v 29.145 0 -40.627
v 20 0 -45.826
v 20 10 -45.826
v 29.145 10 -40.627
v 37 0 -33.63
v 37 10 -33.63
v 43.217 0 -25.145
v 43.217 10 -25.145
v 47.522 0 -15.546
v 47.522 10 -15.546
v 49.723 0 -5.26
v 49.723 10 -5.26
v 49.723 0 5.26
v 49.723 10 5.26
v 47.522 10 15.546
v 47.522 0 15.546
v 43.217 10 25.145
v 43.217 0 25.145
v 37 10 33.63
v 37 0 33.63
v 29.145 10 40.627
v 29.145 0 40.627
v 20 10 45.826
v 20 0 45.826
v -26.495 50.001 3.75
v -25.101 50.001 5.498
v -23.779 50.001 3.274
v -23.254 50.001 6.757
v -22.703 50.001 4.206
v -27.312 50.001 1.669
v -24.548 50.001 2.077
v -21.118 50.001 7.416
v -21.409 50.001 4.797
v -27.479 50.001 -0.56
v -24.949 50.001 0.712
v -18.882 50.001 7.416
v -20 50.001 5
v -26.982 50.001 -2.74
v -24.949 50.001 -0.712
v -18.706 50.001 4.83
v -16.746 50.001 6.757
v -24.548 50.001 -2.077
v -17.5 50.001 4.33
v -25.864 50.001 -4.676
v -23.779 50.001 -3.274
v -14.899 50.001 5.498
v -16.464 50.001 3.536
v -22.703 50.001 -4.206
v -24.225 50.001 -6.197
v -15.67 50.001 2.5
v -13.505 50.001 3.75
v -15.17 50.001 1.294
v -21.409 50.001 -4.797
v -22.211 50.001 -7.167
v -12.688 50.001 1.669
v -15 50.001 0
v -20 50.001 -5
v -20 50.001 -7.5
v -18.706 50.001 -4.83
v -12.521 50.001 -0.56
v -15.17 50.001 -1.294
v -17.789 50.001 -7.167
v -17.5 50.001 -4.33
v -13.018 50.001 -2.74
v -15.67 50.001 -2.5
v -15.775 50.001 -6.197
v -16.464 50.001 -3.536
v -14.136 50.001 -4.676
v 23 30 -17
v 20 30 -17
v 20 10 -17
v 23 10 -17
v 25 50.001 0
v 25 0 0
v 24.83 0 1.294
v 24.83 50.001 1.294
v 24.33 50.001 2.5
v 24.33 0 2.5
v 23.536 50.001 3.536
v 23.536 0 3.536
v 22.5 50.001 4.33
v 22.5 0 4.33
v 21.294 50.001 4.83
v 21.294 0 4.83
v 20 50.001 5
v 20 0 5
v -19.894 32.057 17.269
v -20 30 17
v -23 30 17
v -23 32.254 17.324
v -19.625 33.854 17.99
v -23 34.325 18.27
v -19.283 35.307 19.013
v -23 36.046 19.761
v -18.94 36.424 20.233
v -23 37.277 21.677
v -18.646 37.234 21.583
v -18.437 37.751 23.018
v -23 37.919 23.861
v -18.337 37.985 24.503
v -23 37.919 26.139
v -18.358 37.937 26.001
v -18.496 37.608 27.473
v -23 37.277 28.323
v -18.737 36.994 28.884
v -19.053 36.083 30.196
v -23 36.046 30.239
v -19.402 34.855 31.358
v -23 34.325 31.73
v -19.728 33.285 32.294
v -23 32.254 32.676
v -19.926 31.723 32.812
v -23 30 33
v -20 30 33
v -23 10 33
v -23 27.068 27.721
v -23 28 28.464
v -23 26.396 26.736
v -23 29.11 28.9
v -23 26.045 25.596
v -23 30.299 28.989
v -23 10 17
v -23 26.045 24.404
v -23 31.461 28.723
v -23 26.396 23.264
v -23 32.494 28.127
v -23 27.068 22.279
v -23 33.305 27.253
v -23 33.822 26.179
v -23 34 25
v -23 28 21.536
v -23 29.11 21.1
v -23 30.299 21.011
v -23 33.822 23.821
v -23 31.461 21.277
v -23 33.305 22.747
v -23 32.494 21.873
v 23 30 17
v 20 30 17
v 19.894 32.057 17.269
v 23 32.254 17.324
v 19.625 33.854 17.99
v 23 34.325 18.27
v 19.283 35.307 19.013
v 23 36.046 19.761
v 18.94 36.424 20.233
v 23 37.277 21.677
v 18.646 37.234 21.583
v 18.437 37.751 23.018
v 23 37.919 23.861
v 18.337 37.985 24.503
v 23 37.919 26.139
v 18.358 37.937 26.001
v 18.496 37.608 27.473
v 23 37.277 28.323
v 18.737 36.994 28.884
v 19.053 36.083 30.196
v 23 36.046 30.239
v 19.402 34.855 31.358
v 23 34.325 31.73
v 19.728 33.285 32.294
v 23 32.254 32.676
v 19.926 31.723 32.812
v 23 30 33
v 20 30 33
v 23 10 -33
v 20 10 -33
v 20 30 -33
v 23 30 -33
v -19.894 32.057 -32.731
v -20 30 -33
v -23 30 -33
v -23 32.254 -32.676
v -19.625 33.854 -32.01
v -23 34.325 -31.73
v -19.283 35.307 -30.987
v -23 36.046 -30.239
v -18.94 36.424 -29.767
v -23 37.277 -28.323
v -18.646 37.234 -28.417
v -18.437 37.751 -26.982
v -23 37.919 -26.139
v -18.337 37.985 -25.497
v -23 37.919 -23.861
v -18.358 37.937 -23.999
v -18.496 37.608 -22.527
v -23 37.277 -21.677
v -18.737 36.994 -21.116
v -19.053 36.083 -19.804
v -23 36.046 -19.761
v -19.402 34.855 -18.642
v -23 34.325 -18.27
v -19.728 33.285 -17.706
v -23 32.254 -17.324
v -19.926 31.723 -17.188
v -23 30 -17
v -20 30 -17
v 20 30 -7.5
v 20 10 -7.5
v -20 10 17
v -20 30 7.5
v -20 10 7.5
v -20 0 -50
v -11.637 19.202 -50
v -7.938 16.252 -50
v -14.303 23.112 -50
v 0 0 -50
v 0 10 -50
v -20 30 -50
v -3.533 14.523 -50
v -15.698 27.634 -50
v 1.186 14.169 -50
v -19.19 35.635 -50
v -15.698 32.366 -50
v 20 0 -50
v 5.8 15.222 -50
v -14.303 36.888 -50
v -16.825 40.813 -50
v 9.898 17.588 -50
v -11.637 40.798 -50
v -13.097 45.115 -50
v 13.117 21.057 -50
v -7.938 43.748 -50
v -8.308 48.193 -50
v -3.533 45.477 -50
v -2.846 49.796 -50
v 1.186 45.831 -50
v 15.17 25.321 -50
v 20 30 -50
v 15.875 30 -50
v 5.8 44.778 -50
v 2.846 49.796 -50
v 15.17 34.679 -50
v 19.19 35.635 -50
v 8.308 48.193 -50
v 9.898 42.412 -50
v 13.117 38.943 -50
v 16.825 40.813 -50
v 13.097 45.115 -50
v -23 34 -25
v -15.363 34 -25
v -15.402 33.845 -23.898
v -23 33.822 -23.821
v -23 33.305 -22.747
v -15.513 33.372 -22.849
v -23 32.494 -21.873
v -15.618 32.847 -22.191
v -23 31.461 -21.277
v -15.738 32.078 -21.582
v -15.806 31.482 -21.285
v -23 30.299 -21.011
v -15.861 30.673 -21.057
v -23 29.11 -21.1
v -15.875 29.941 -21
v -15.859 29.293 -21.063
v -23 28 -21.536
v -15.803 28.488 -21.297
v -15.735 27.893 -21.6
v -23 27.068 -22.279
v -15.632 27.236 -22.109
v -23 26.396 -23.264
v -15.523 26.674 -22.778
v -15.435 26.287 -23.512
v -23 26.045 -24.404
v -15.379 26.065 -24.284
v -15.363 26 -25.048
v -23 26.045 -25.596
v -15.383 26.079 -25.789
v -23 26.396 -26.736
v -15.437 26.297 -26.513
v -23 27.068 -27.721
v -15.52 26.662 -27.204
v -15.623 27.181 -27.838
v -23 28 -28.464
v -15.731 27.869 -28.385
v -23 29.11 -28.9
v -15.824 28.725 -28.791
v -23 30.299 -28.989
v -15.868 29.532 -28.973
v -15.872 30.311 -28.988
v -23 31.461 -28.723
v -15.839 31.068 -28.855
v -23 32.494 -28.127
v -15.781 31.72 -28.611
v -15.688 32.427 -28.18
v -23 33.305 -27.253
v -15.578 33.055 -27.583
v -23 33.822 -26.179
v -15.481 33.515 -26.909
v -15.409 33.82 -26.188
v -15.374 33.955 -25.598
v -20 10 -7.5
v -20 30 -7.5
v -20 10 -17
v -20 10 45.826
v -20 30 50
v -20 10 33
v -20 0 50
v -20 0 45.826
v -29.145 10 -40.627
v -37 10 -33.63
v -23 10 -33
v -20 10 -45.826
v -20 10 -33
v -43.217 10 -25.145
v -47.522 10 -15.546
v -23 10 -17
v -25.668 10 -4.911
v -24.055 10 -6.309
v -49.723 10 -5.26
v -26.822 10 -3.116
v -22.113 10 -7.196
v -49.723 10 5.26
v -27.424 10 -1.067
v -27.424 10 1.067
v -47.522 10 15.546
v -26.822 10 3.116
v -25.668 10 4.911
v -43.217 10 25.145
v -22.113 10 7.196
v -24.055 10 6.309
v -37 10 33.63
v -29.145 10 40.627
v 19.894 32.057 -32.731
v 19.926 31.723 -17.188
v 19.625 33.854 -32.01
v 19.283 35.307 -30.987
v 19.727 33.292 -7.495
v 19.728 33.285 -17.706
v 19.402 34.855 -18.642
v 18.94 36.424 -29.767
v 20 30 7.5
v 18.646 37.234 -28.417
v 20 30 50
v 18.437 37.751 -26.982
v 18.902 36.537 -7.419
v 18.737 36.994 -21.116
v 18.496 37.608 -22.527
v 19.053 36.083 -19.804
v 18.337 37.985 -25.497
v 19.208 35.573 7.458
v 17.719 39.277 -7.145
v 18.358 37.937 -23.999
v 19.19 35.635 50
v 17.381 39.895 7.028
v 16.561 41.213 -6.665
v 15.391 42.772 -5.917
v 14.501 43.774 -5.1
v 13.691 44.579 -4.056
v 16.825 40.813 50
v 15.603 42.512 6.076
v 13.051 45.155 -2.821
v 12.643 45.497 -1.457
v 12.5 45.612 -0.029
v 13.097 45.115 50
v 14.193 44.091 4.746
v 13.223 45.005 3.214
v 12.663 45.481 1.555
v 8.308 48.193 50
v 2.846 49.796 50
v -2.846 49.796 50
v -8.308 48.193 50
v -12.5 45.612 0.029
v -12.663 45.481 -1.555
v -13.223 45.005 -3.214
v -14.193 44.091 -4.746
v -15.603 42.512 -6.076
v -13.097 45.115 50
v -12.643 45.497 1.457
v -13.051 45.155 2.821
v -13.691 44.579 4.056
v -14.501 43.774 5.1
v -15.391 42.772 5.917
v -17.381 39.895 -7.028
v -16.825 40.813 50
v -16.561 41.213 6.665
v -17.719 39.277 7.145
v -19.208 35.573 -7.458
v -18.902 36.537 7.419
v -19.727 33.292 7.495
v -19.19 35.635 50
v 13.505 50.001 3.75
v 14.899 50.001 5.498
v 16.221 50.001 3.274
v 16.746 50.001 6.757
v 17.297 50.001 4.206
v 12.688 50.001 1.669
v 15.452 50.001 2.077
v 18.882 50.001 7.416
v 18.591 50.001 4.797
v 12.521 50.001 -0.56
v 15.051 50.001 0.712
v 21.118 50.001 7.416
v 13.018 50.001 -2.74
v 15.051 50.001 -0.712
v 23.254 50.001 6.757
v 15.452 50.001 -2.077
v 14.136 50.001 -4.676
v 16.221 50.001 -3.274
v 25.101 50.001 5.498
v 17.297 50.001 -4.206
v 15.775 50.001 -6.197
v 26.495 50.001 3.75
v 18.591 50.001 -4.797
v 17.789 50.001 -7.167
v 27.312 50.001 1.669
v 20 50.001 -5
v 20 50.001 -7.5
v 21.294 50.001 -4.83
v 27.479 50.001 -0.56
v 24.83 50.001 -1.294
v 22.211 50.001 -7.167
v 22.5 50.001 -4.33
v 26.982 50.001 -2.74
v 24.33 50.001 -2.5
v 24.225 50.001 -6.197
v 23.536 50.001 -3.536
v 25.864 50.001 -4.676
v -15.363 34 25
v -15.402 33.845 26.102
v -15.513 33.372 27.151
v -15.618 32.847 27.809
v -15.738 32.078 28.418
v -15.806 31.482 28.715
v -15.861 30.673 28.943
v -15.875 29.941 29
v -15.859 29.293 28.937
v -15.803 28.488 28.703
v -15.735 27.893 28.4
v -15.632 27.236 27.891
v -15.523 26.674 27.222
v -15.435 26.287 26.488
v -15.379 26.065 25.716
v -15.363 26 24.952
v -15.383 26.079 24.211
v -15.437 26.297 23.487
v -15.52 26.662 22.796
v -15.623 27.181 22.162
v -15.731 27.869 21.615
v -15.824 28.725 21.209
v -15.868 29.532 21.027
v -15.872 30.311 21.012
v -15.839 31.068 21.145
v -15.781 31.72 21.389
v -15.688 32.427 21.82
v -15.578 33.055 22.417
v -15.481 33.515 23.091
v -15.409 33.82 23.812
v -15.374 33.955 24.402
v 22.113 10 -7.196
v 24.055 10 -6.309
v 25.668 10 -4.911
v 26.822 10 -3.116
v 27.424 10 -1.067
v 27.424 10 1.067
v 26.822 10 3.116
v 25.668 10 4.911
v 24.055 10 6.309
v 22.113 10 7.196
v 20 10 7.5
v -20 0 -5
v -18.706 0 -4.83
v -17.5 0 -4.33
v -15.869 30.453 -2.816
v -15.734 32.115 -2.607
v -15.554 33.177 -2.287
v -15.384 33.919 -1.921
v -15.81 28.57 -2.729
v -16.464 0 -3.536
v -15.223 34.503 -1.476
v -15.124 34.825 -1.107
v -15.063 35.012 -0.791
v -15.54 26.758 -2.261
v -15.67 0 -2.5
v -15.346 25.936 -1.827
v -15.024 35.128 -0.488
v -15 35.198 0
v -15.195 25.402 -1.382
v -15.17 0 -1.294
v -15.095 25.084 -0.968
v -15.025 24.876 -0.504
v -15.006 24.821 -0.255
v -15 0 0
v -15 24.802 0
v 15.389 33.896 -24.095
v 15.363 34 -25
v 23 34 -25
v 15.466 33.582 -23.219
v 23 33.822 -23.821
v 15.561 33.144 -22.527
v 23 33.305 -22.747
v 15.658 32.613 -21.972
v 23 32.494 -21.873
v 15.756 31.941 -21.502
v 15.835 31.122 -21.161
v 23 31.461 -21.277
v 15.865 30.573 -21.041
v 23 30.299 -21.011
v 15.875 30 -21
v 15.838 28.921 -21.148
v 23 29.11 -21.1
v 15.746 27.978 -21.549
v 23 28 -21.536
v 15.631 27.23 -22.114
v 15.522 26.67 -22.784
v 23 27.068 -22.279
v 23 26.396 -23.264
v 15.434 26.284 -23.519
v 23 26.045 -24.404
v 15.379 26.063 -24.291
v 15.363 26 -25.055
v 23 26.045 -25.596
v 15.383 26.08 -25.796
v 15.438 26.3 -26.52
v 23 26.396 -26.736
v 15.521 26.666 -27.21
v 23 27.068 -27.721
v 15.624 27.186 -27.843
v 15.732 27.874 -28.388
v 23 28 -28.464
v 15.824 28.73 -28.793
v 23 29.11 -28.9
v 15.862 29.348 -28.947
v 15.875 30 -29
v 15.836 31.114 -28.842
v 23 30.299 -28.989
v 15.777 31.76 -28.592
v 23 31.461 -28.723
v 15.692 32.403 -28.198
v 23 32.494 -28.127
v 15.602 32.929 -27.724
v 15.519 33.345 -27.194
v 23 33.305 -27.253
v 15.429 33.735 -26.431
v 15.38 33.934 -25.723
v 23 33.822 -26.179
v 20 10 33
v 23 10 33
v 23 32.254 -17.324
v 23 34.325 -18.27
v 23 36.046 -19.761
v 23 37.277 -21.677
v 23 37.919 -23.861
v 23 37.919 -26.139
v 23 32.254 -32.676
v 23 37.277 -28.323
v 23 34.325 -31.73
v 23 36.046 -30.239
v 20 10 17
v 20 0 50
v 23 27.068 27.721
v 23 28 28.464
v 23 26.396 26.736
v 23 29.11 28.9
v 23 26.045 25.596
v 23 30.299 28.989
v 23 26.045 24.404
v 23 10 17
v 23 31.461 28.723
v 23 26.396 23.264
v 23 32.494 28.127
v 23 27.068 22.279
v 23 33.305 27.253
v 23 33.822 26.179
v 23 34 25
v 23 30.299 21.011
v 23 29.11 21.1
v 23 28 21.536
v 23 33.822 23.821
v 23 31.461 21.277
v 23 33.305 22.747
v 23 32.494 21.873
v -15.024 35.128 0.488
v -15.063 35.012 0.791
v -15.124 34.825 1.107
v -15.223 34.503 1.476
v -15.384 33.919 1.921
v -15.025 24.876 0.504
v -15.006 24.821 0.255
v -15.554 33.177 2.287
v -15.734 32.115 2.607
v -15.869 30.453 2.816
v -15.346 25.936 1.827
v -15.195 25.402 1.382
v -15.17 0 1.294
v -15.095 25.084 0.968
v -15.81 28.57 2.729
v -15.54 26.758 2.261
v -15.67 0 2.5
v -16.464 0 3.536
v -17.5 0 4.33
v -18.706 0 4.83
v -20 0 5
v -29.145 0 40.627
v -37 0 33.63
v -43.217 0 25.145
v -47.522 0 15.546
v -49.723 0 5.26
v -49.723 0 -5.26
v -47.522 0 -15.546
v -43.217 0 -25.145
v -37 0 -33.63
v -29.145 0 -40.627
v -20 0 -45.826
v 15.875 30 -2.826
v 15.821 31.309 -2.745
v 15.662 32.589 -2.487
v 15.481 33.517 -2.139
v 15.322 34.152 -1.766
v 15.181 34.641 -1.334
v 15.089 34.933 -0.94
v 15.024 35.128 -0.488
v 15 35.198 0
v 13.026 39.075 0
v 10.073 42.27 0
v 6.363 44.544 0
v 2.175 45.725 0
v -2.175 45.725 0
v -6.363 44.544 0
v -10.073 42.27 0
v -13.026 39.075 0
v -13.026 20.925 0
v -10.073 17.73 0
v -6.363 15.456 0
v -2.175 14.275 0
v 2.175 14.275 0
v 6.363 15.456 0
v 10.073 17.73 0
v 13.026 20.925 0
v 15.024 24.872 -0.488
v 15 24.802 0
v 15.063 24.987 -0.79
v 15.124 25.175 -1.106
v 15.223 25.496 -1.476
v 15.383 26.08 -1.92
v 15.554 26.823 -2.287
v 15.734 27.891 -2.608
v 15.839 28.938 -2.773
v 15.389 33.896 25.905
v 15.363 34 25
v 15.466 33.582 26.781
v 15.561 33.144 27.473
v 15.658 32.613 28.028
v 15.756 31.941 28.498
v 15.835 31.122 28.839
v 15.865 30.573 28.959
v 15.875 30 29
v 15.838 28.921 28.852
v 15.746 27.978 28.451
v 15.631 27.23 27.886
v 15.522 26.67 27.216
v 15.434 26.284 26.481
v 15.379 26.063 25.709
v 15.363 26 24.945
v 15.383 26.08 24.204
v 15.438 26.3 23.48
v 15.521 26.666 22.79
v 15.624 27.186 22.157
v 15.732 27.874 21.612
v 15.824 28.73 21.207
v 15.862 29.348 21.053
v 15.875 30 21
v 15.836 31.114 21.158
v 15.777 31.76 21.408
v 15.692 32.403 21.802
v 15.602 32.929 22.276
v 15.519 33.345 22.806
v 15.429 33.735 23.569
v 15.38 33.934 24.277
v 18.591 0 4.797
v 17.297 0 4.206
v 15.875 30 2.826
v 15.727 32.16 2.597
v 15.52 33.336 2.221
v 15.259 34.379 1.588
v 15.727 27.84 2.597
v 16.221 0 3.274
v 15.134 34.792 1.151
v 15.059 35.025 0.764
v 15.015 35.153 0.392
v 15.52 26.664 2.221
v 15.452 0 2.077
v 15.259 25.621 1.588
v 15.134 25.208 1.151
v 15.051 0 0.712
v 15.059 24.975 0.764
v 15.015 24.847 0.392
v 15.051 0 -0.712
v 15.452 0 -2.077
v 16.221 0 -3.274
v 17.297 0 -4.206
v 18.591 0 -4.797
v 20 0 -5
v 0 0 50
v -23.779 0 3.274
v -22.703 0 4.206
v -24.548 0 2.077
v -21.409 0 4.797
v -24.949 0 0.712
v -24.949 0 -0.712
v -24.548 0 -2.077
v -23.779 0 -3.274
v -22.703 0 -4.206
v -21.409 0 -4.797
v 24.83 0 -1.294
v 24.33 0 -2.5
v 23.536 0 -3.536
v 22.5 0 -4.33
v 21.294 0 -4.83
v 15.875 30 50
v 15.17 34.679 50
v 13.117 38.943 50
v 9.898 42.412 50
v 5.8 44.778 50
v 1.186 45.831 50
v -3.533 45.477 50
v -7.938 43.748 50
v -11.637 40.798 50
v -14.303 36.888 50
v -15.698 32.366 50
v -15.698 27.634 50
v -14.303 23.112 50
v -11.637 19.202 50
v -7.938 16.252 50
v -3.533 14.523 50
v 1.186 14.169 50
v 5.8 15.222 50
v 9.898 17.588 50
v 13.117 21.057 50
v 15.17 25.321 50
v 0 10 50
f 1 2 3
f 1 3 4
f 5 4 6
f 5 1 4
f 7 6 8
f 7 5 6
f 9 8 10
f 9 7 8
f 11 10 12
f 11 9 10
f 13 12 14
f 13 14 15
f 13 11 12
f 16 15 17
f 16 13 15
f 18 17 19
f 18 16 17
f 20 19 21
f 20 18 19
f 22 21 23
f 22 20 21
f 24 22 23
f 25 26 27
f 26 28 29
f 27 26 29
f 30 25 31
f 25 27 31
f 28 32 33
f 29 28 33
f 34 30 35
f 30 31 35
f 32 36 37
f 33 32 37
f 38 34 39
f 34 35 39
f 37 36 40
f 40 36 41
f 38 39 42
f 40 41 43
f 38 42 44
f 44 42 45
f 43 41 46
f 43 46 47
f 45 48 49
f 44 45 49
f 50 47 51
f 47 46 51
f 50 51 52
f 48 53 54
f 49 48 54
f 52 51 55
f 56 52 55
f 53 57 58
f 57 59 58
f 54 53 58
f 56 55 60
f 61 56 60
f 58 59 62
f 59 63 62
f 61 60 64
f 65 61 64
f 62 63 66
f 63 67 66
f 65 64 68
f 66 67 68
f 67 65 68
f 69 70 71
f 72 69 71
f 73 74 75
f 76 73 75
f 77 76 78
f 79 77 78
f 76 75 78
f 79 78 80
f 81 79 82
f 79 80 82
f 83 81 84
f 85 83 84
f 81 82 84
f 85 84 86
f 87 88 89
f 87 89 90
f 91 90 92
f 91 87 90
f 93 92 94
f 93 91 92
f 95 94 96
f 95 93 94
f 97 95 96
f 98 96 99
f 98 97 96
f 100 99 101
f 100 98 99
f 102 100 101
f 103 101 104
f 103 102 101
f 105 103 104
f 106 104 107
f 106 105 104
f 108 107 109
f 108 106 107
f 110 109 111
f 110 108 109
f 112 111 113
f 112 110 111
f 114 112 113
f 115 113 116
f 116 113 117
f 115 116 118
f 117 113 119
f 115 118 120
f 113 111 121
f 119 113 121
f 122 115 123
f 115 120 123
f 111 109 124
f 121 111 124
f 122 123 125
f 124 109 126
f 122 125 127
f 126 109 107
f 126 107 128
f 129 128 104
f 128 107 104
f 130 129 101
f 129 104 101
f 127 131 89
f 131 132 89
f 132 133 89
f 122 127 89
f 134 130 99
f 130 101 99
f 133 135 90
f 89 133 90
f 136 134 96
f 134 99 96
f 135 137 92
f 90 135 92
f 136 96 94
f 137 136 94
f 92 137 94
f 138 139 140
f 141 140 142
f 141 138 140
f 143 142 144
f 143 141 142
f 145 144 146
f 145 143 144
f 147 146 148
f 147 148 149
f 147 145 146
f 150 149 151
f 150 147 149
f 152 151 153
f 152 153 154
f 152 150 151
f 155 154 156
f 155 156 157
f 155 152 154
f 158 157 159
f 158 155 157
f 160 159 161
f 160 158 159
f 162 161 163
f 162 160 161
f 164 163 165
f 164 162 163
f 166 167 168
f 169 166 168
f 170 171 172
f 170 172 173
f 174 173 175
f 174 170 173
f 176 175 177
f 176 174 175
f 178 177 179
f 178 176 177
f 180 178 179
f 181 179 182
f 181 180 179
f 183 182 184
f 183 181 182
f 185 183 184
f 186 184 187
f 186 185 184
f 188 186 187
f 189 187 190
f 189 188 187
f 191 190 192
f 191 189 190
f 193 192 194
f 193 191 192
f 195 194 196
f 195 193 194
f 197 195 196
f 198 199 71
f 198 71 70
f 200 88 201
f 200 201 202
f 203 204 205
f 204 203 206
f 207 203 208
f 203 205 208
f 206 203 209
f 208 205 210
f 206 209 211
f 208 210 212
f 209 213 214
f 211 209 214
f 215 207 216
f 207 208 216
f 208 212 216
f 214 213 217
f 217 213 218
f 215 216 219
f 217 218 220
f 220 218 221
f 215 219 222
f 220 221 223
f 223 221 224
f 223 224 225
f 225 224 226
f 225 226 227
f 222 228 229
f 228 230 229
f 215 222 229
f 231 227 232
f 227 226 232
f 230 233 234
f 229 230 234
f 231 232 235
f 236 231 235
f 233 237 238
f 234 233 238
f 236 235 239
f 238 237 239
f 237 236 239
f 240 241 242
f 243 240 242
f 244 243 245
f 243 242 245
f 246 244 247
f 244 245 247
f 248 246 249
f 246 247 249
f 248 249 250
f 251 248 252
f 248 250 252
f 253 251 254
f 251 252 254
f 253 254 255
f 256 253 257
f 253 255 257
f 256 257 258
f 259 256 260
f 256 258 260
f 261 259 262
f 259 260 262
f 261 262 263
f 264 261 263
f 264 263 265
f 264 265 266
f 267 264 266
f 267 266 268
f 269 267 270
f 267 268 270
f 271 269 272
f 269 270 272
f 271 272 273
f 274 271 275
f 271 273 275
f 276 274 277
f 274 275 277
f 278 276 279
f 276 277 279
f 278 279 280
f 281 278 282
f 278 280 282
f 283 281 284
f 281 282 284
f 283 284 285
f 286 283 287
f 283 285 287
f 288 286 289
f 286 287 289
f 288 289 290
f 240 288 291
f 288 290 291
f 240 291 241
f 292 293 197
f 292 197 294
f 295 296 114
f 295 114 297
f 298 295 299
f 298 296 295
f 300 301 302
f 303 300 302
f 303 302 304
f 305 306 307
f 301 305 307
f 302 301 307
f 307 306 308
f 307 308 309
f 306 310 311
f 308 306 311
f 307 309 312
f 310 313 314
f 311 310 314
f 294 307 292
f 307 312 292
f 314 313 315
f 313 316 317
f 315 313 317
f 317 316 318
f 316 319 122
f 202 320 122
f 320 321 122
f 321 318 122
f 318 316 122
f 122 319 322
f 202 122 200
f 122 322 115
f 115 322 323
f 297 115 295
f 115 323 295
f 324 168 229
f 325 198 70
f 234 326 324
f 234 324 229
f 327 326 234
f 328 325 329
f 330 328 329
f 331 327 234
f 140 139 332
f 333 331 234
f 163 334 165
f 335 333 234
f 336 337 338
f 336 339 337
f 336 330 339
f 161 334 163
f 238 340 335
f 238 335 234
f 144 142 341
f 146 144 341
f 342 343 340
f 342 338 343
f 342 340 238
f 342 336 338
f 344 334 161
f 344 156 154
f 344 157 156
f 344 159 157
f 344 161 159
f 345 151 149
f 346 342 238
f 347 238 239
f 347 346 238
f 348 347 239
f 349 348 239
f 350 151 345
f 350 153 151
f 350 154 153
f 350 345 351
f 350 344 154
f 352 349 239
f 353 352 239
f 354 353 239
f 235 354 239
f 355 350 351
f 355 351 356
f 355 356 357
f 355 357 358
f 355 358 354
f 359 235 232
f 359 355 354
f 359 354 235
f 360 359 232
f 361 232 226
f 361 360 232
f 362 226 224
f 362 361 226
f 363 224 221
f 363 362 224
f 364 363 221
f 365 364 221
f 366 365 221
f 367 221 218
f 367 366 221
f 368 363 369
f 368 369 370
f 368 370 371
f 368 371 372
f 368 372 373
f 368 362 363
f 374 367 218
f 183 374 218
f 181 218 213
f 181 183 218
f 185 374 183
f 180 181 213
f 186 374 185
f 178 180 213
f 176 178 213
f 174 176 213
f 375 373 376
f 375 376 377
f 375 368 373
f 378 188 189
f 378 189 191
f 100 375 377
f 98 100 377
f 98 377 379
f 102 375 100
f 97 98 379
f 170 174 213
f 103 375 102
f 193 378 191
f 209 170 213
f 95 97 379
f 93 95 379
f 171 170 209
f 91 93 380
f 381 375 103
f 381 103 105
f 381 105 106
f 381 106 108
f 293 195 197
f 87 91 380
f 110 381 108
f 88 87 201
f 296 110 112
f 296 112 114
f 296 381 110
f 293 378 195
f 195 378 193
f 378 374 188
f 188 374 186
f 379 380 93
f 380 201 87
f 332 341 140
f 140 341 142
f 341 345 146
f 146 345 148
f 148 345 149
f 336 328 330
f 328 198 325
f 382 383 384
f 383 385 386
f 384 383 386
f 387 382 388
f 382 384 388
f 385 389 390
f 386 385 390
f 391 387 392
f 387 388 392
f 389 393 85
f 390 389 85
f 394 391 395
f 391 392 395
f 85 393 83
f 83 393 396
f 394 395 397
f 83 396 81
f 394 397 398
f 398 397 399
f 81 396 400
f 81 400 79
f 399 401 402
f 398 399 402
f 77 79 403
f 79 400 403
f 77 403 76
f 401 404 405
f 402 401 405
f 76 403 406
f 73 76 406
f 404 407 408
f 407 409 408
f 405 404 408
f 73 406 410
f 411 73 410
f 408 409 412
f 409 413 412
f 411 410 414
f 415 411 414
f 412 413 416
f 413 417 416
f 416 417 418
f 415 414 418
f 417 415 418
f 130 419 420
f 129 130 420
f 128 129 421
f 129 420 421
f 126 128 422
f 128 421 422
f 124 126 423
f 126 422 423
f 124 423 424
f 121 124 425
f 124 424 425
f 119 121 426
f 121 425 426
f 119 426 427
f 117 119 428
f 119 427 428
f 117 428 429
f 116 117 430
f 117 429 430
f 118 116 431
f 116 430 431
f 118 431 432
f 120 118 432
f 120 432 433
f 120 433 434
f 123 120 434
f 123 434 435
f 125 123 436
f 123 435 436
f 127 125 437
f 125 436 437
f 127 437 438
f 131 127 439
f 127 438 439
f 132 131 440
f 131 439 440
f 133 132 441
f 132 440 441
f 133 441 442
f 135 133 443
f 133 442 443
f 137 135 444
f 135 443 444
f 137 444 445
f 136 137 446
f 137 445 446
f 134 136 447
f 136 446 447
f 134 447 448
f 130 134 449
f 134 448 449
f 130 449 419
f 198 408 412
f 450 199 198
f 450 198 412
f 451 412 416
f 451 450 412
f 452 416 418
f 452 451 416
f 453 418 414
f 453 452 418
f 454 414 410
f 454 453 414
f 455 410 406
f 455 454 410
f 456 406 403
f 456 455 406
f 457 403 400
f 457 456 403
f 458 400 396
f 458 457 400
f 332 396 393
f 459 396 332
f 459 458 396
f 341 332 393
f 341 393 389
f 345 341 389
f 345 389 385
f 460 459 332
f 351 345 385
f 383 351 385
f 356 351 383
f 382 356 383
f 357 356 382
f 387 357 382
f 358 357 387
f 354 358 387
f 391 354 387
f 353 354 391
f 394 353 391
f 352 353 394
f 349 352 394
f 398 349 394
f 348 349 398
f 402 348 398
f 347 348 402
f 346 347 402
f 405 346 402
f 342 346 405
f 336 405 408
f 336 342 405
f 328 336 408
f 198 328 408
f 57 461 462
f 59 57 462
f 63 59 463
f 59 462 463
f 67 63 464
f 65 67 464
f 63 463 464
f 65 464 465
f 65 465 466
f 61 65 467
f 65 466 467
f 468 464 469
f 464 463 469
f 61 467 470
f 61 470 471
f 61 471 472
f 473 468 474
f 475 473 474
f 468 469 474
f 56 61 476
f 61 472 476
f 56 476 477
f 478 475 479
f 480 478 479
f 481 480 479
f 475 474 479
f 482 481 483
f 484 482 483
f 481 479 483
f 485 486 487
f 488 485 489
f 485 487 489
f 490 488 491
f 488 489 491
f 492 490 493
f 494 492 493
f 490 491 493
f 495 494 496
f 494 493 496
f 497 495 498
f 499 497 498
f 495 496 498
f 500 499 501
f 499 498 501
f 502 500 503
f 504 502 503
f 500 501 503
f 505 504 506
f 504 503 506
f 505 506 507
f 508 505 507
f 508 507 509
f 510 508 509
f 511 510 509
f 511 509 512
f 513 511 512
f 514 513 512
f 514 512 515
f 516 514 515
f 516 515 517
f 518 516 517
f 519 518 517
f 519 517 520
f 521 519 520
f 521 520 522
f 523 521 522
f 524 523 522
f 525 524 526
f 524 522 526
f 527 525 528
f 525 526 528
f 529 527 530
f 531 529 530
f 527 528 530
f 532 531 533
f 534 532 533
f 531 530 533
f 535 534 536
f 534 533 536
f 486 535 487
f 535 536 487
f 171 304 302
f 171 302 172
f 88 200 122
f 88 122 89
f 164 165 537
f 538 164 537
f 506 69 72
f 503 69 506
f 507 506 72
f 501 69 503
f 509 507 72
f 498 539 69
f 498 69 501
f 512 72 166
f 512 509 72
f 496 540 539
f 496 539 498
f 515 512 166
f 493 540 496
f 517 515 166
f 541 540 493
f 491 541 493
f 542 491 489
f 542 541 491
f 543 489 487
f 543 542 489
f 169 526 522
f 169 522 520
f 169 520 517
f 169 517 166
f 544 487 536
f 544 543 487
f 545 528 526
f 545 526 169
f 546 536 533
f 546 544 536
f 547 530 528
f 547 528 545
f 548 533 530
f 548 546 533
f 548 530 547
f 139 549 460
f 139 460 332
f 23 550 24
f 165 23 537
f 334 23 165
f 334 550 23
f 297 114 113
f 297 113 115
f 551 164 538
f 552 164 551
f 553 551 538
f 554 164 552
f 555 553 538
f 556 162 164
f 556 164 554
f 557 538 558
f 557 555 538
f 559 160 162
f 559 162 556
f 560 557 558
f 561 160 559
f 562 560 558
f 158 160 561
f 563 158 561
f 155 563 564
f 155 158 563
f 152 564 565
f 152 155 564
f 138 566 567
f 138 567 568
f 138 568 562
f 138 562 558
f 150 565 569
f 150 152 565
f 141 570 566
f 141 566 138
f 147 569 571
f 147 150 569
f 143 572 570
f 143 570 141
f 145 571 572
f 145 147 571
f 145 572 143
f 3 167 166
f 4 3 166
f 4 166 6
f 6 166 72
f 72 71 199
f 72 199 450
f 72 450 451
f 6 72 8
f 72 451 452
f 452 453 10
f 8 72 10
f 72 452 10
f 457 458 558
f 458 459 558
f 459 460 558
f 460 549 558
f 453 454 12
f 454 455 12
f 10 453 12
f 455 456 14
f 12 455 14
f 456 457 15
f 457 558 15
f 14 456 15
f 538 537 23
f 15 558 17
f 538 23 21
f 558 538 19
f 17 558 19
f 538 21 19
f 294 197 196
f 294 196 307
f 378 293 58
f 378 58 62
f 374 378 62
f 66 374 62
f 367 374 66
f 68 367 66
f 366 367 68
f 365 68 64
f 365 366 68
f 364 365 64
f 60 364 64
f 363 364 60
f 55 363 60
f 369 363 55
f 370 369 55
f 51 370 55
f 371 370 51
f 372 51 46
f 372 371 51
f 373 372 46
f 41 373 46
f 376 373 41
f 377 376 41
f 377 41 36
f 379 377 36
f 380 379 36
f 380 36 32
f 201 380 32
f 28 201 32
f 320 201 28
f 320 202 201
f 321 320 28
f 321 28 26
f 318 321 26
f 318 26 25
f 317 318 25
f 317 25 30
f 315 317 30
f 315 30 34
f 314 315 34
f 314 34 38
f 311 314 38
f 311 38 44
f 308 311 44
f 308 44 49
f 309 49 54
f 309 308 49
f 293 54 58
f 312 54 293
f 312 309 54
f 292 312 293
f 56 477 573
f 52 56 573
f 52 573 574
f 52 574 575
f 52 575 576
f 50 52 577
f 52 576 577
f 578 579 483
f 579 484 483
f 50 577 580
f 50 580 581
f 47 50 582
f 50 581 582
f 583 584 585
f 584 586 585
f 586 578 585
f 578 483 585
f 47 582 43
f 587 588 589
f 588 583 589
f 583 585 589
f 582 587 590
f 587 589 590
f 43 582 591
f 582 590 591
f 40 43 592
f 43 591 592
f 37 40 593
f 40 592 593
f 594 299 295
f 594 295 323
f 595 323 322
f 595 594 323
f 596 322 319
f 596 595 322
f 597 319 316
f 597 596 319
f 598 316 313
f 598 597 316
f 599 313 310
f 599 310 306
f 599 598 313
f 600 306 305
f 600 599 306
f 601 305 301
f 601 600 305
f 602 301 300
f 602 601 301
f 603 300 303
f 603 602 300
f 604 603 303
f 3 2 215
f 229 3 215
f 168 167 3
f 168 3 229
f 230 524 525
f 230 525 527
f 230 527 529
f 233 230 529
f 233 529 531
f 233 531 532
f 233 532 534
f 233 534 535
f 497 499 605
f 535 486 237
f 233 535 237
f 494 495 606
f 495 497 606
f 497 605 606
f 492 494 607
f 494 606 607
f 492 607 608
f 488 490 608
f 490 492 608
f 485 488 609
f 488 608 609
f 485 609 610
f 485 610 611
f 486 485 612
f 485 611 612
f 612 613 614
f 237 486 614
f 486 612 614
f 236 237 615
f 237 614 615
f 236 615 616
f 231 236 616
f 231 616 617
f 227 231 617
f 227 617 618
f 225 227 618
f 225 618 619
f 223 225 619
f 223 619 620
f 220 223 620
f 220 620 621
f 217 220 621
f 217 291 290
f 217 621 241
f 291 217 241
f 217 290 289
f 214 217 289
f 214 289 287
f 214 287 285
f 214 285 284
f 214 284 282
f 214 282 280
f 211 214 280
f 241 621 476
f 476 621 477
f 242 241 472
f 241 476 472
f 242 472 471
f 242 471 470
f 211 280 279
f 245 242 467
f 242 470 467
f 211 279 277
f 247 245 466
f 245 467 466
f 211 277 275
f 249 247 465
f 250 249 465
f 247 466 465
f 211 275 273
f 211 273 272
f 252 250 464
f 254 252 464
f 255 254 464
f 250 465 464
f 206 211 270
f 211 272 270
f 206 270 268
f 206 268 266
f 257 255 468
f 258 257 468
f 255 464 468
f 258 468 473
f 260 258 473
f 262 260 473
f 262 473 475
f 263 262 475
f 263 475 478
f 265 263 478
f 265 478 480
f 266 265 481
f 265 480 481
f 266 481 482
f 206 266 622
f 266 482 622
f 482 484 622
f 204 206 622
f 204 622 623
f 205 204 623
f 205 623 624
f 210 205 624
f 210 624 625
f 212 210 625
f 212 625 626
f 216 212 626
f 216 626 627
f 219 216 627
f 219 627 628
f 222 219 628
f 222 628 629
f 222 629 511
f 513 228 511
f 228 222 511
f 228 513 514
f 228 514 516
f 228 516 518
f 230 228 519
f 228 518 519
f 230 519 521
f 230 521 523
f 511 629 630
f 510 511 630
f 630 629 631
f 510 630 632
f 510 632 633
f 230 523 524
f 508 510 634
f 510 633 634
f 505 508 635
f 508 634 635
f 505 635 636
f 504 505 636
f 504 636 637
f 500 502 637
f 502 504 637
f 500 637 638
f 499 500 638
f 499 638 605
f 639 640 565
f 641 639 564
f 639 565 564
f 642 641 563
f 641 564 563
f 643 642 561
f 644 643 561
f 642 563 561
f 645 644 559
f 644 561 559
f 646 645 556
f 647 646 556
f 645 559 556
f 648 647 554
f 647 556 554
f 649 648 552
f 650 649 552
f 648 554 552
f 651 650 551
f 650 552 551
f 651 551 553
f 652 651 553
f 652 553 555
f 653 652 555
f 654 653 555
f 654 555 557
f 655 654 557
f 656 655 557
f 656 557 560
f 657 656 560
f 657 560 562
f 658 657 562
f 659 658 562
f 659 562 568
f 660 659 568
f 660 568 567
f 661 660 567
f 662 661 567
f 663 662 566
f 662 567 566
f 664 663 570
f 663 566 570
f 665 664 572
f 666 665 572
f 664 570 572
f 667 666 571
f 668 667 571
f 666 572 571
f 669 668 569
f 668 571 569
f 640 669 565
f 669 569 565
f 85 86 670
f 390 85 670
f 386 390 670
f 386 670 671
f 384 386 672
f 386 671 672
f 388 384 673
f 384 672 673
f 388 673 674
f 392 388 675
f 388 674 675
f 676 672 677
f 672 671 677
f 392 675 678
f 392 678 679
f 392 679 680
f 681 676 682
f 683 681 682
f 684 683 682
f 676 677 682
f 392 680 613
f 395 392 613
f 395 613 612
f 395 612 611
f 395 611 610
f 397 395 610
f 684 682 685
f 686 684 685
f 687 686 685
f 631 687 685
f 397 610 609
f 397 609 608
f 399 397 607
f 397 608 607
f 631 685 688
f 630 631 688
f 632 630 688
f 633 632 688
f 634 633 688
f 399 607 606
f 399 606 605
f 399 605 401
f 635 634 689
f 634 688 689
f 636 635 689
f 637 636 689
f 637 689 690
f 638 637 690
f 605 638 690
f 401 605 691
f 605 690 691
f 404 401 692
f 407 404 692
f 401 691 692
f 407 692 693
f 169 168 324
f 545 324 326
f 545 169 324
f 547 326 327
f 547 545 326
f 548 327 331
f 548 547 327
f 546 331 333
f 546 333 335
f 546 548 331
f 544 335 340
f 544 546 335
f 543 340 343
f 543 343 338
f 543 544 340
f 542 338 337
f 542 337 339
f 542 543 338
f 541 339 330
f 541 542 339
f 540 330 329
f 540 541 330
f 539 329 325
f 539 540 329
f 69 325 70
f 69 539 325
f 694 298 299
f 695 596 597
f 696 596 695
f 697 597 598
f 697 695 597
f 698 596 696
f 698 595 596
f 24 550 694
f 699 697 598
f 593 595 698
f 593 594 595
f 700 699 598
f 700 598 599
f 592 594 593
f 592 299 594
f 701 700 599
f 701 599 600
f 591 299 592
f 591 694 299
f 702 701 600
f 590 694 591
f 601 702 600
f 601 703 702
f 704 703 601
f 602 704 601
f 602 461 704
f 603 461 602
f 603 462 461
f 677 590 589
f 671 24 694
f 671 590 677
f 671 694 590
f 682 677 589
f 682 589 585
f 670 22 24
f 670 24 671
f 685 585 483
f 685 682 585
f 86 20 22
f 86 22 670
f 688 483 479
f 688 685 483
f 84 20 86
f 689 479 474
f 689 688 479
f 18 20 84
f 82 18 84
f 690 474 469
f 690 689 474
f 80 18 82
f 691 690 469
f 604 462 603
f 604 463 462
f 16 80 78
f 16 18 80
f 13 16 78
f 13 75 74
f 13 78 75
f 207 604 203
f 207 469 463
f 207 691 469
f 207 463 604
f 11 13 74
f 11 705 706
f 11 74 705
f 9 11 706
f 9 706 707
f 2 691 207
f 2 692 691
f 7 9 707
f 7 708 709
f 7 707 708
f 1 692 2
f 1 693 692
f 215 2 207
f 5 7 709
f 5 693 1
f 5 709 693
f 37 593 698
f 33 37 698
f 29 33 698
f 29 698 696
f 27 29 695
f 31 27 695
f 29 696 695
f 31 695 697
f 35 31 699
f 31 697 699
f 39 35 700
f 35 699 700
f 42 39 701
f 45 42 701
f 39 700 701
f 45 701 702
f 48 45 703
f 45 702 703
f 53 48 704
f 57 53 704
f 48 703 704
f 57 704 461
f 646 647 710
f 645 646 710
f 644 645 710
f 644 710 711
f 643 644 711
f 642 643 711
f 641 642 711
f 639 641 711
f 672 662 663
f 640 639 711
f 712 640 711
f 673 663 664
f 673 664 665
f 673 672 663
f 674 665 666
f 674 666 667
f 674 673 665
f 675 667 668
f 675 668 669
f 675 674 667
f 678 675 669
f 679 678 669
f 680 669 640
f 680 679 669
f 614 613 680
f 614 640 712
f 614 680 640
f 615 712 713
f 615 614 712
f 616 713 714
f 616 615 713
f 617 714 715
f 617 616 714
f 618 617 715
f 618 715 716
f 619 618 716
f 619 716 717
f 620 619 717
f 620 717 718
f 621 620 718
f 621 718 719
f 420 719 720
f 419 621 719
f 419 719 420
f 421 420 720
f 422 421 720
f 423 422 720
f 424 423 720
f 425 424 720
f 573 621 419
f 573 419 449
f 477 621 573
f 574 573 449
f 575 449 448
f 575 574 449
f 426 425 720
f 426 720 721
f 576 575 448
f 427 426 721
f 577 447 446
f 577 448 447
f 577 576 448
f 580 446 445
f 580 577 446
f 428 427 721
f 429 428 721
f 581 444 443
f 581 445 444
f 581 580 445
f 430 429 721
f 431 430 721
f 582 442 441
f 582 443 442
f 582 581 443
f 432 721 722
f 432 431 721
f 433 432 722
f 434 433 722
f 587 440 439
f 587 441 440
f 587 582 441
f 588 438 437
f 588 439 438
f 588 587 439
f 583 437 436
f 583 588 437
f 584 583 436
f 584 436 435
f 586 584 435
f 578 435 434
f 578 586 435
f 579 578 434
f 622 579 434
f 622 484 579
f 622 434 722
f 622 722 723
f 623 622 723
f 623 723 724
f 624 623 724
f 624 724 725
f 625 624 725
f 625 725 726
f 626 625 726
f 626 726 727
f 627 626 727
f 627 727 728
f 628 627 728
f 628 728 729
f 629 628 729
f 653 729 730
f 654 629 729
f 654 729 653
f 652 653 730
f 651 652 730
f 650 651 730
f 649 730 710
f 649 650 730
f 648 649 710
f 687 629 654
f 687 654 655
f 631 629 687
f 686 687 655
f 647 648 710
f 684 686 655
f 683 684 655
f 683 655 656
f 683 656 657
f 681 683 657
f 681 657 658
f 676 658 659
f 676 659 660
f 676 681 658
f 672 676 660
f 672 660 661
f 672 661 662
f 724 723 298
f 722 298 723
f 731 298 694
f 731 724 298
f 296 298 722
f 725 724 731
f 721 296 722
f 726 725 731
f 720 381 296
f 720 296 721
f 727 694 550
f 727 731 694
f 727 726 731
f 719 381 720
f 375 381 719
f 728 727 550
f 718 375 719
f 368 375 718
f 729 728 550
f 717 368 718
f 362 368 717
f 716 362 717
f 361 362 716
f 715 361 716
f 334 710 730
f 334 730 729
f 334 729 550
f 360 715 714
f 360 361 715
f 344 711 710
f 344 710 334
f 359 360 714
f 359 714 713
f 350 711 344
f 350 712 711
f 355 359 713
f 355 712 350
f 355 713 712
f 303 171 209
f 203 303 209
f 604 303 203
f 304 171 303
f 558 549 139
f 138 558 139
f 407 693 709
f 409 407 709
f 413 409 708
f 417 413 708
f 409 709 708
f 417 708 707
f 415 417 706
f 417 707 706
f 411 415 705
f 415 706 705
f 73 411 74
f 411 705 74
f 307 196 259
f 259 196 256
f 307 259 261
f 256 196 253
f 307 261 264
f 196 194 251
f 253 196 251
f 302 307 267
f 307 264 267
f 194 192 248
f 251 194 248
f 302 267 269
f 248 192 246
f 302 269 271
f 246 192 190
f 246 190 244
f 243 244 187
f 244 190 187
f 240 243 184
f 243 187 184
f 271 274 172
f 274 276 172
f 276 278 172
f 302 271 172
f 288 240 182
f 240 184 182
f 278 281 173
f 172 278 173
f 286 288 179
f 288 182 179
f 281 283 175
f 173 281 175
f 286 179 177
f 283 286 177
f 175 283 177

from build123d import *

# Parameters (mm, degrees)
SKETCH1_R               = 15.875
EXTRUDE1_DEPTH          = 50
SKETCH2_R               = 50
EXTRUDE2_DEPTH          = 10
SKETCH2_3_R             = 7.5
EXTRUDE3_DEPTH          = 50.001
EXTRUDE4_DEPTH          = 3
EXTRUDE4_DEPTH_BACK     = 43
SKETCH6_4_R             = 4
CUT_EXTRUDE1_DEPTH      = 31
CUT_EXTRUDE1_DEPTH_BACK = 71
CUT_EXTRUDE2_DEPTH      = 51.0010001
SKETCH1_3_R             = 15.875
CUT_EXTRUDE3_DEPTH      = 51.0000001
CUT_EXTRUDE3_DEPTH_BACK = 51.0000001


with BuildPart() as part:
    # Sketch1 → Extrude1 (new body, symmetric)
    with BuildSketch(Plane.XY):
        with BuildLine():
            Line((20, 0), (20, 30))
            ThreePointArc((20, 30), (0, 50), (-20, 30))
            Line((-20, 30), (-20, 0))
            Line((-20, 0), (20, 0))
        make_face()
        with Locations((0, 30)):
            Circle(SKETCH1_R, mode=Mode.SUBTRACT)
        with Locations((0, 30)):
            Circle(SKETCH1_R)
    extrude(amount=EXTRUDE1_DEPTH, both=True)

    # Sketch2 → Extrude2 (add)
    with BuildSketch(Plane.XZ):
        Circle(SKETCH2_R)
    extrude(amount=-EXTRUDE2_DEPTH)

    # Sketch2_3 → Extrude3 (add)
    with BuildSketch(Plane.XZ):
        with Locations(Location((-20, 0, 0), (0, 0, 270))):  # turned: the seam where the file's is
            Circle(SKETCH2_3_R)
        with Locations(Location((20, 0, 0), (0, 0, 270))):  # turned: the seam where the file's is
            Circle(SKETCH2_3_R)
    extrude(amount=-EXTRUDE3_DEPTH)

    # Sketch3 → Extrude4 (add, two sides)
    with BuildSketch(Plane(origin=(20, 0, 0), x_dir=(0, 0, -1), z_dir=(1, 0, 0))) as extrude4_sk:
        with BuildLine():
            Line((-33, 30), (-33, 10))
            Line((-33, 10), (-17, 10))
            Line((-17, 10), (-17, 30))
            ThreePointArc((-17, 30), (-25, 38), (-33, 30))
        make_face()
        with BuildLine():
            Line((17, 30), (17, 10))
            Line((17, 10), (33, 10))
            Line((33, 10), (33, 30))
            ThreePointArc((33, 30), (25, 38), (17, 30))
        make_face()
    extrude(amount=EXTRUDE4_DEPTH)
    extrude(extrude4_sk.sketch, amount=-EXTRUDE4_DEPTH_BACK)

    # Sketch6_4 → Cut-Extrude1 (cut, two sides)
    with BuildSketch(Plane(origin=(20, 0, 0), x_dir=(0, 0, -1), z_dir=(1, 0, 0))) as cut_extrude1_sk:
        with Locations(Location((-25, 30, 0), (0, 0, 90))):  # turned: the seam where the file's is
            Circle(SKETCH6_4_R)
        with Locations(Location((25, 30, 0), (0, 0, 90))):  # turned: the seam where the file's is
            Circle(SKETCH6_4_R)
    extrude(amount=CUT_EXTRUDE1_DEPTH, mode=Mode.SUBTRACT)
    extrude(cut_extrude1_sk.sketch, amount=-CUT_EXTRUDE1_DEPTH_BACK, mode=Mode.SUBTRACT)

    # Sketch2_4 → Cut-Extrude2 (cut, through all)
    with BuildSketch(Plane.XZ):
        with BuildLine():
            Line((20, -5), (20, 5))
            ThreePointArc((20, 5), (15, 0), (20, -5))
        make_face()
        with BuildLine():
            ThreePointArc((25, 0), (23.535533906, 3.535533906), (20, 5))
            Line((20, 5), (20, -5))
            ThreePointArc((20, -5), (23.535533906, -3.535533906), (25, 0))
        make_face()
        with BuildLine():
            Line((20, -5), (20, 5))
            ThreePointArc((20, 5), (15, 0), (20, -5))
        make_face()
        with BuildLine():
            ThreePointArc((25, 0), (23.535533906, 3.535533906), (20, 5))
            Line((20, 5), (20, -5))
            ThreePointArc((20, -5), (23.535533906, -3.535533906), (25, 0))
        make_face()
        with BuildLine():
            Line((-20, -5), (-20, 5))
            ThreePointArc((-20, 5), (-25, 0), (-20, -5))
        make_face()
        with BuildLine():
            ThreePointArc((-15, 0), (-16.464466094, 3.535533906), (-20, 5))
            Line((-20, 5), (-20, -5))
            ThreePointArc((-20, -5), (-16.464466094, -3.535533906), (-15, 0))
        make_face()
        with BuildLine():
            Line((-20, -5), (-20, 5))
            ThreePointArc((-20, 5), (-25, 0), (-20, -5))
        make_face()
        with BuildLine():
            ThreePointArc((-15, 0), (-16.464466094, 3.535533906), (-20, 5))
            Line((-20, 5), (-20, -5))
            ThreePointArc((-20, -5), (-16.464466094, -3.535533906), (-15, 0))
        make_face()
    extrude(amount=-CUT_EXTRUDE2_DEPTH, mode=Mode.SUBTRACT)

    # Sketch1_3 → Cut-Extrude3 (cut, two sides)
    with BuildSketch(Plane.XY) as cut_extrude3_sk:
        with Locations((0, 30)):
            Circle(SKETCH1_3_R)
    extrude(amount=CUT_EXTRUDE3_DEPTH, mode=Mode.SUBTRACT)
    extrude(cut_extrude3_sk.sketch, amount=-CUT_EXTRUDE3_DEPTH_BACK, mode=Mode.SUBTRACT)


solid = part.part
